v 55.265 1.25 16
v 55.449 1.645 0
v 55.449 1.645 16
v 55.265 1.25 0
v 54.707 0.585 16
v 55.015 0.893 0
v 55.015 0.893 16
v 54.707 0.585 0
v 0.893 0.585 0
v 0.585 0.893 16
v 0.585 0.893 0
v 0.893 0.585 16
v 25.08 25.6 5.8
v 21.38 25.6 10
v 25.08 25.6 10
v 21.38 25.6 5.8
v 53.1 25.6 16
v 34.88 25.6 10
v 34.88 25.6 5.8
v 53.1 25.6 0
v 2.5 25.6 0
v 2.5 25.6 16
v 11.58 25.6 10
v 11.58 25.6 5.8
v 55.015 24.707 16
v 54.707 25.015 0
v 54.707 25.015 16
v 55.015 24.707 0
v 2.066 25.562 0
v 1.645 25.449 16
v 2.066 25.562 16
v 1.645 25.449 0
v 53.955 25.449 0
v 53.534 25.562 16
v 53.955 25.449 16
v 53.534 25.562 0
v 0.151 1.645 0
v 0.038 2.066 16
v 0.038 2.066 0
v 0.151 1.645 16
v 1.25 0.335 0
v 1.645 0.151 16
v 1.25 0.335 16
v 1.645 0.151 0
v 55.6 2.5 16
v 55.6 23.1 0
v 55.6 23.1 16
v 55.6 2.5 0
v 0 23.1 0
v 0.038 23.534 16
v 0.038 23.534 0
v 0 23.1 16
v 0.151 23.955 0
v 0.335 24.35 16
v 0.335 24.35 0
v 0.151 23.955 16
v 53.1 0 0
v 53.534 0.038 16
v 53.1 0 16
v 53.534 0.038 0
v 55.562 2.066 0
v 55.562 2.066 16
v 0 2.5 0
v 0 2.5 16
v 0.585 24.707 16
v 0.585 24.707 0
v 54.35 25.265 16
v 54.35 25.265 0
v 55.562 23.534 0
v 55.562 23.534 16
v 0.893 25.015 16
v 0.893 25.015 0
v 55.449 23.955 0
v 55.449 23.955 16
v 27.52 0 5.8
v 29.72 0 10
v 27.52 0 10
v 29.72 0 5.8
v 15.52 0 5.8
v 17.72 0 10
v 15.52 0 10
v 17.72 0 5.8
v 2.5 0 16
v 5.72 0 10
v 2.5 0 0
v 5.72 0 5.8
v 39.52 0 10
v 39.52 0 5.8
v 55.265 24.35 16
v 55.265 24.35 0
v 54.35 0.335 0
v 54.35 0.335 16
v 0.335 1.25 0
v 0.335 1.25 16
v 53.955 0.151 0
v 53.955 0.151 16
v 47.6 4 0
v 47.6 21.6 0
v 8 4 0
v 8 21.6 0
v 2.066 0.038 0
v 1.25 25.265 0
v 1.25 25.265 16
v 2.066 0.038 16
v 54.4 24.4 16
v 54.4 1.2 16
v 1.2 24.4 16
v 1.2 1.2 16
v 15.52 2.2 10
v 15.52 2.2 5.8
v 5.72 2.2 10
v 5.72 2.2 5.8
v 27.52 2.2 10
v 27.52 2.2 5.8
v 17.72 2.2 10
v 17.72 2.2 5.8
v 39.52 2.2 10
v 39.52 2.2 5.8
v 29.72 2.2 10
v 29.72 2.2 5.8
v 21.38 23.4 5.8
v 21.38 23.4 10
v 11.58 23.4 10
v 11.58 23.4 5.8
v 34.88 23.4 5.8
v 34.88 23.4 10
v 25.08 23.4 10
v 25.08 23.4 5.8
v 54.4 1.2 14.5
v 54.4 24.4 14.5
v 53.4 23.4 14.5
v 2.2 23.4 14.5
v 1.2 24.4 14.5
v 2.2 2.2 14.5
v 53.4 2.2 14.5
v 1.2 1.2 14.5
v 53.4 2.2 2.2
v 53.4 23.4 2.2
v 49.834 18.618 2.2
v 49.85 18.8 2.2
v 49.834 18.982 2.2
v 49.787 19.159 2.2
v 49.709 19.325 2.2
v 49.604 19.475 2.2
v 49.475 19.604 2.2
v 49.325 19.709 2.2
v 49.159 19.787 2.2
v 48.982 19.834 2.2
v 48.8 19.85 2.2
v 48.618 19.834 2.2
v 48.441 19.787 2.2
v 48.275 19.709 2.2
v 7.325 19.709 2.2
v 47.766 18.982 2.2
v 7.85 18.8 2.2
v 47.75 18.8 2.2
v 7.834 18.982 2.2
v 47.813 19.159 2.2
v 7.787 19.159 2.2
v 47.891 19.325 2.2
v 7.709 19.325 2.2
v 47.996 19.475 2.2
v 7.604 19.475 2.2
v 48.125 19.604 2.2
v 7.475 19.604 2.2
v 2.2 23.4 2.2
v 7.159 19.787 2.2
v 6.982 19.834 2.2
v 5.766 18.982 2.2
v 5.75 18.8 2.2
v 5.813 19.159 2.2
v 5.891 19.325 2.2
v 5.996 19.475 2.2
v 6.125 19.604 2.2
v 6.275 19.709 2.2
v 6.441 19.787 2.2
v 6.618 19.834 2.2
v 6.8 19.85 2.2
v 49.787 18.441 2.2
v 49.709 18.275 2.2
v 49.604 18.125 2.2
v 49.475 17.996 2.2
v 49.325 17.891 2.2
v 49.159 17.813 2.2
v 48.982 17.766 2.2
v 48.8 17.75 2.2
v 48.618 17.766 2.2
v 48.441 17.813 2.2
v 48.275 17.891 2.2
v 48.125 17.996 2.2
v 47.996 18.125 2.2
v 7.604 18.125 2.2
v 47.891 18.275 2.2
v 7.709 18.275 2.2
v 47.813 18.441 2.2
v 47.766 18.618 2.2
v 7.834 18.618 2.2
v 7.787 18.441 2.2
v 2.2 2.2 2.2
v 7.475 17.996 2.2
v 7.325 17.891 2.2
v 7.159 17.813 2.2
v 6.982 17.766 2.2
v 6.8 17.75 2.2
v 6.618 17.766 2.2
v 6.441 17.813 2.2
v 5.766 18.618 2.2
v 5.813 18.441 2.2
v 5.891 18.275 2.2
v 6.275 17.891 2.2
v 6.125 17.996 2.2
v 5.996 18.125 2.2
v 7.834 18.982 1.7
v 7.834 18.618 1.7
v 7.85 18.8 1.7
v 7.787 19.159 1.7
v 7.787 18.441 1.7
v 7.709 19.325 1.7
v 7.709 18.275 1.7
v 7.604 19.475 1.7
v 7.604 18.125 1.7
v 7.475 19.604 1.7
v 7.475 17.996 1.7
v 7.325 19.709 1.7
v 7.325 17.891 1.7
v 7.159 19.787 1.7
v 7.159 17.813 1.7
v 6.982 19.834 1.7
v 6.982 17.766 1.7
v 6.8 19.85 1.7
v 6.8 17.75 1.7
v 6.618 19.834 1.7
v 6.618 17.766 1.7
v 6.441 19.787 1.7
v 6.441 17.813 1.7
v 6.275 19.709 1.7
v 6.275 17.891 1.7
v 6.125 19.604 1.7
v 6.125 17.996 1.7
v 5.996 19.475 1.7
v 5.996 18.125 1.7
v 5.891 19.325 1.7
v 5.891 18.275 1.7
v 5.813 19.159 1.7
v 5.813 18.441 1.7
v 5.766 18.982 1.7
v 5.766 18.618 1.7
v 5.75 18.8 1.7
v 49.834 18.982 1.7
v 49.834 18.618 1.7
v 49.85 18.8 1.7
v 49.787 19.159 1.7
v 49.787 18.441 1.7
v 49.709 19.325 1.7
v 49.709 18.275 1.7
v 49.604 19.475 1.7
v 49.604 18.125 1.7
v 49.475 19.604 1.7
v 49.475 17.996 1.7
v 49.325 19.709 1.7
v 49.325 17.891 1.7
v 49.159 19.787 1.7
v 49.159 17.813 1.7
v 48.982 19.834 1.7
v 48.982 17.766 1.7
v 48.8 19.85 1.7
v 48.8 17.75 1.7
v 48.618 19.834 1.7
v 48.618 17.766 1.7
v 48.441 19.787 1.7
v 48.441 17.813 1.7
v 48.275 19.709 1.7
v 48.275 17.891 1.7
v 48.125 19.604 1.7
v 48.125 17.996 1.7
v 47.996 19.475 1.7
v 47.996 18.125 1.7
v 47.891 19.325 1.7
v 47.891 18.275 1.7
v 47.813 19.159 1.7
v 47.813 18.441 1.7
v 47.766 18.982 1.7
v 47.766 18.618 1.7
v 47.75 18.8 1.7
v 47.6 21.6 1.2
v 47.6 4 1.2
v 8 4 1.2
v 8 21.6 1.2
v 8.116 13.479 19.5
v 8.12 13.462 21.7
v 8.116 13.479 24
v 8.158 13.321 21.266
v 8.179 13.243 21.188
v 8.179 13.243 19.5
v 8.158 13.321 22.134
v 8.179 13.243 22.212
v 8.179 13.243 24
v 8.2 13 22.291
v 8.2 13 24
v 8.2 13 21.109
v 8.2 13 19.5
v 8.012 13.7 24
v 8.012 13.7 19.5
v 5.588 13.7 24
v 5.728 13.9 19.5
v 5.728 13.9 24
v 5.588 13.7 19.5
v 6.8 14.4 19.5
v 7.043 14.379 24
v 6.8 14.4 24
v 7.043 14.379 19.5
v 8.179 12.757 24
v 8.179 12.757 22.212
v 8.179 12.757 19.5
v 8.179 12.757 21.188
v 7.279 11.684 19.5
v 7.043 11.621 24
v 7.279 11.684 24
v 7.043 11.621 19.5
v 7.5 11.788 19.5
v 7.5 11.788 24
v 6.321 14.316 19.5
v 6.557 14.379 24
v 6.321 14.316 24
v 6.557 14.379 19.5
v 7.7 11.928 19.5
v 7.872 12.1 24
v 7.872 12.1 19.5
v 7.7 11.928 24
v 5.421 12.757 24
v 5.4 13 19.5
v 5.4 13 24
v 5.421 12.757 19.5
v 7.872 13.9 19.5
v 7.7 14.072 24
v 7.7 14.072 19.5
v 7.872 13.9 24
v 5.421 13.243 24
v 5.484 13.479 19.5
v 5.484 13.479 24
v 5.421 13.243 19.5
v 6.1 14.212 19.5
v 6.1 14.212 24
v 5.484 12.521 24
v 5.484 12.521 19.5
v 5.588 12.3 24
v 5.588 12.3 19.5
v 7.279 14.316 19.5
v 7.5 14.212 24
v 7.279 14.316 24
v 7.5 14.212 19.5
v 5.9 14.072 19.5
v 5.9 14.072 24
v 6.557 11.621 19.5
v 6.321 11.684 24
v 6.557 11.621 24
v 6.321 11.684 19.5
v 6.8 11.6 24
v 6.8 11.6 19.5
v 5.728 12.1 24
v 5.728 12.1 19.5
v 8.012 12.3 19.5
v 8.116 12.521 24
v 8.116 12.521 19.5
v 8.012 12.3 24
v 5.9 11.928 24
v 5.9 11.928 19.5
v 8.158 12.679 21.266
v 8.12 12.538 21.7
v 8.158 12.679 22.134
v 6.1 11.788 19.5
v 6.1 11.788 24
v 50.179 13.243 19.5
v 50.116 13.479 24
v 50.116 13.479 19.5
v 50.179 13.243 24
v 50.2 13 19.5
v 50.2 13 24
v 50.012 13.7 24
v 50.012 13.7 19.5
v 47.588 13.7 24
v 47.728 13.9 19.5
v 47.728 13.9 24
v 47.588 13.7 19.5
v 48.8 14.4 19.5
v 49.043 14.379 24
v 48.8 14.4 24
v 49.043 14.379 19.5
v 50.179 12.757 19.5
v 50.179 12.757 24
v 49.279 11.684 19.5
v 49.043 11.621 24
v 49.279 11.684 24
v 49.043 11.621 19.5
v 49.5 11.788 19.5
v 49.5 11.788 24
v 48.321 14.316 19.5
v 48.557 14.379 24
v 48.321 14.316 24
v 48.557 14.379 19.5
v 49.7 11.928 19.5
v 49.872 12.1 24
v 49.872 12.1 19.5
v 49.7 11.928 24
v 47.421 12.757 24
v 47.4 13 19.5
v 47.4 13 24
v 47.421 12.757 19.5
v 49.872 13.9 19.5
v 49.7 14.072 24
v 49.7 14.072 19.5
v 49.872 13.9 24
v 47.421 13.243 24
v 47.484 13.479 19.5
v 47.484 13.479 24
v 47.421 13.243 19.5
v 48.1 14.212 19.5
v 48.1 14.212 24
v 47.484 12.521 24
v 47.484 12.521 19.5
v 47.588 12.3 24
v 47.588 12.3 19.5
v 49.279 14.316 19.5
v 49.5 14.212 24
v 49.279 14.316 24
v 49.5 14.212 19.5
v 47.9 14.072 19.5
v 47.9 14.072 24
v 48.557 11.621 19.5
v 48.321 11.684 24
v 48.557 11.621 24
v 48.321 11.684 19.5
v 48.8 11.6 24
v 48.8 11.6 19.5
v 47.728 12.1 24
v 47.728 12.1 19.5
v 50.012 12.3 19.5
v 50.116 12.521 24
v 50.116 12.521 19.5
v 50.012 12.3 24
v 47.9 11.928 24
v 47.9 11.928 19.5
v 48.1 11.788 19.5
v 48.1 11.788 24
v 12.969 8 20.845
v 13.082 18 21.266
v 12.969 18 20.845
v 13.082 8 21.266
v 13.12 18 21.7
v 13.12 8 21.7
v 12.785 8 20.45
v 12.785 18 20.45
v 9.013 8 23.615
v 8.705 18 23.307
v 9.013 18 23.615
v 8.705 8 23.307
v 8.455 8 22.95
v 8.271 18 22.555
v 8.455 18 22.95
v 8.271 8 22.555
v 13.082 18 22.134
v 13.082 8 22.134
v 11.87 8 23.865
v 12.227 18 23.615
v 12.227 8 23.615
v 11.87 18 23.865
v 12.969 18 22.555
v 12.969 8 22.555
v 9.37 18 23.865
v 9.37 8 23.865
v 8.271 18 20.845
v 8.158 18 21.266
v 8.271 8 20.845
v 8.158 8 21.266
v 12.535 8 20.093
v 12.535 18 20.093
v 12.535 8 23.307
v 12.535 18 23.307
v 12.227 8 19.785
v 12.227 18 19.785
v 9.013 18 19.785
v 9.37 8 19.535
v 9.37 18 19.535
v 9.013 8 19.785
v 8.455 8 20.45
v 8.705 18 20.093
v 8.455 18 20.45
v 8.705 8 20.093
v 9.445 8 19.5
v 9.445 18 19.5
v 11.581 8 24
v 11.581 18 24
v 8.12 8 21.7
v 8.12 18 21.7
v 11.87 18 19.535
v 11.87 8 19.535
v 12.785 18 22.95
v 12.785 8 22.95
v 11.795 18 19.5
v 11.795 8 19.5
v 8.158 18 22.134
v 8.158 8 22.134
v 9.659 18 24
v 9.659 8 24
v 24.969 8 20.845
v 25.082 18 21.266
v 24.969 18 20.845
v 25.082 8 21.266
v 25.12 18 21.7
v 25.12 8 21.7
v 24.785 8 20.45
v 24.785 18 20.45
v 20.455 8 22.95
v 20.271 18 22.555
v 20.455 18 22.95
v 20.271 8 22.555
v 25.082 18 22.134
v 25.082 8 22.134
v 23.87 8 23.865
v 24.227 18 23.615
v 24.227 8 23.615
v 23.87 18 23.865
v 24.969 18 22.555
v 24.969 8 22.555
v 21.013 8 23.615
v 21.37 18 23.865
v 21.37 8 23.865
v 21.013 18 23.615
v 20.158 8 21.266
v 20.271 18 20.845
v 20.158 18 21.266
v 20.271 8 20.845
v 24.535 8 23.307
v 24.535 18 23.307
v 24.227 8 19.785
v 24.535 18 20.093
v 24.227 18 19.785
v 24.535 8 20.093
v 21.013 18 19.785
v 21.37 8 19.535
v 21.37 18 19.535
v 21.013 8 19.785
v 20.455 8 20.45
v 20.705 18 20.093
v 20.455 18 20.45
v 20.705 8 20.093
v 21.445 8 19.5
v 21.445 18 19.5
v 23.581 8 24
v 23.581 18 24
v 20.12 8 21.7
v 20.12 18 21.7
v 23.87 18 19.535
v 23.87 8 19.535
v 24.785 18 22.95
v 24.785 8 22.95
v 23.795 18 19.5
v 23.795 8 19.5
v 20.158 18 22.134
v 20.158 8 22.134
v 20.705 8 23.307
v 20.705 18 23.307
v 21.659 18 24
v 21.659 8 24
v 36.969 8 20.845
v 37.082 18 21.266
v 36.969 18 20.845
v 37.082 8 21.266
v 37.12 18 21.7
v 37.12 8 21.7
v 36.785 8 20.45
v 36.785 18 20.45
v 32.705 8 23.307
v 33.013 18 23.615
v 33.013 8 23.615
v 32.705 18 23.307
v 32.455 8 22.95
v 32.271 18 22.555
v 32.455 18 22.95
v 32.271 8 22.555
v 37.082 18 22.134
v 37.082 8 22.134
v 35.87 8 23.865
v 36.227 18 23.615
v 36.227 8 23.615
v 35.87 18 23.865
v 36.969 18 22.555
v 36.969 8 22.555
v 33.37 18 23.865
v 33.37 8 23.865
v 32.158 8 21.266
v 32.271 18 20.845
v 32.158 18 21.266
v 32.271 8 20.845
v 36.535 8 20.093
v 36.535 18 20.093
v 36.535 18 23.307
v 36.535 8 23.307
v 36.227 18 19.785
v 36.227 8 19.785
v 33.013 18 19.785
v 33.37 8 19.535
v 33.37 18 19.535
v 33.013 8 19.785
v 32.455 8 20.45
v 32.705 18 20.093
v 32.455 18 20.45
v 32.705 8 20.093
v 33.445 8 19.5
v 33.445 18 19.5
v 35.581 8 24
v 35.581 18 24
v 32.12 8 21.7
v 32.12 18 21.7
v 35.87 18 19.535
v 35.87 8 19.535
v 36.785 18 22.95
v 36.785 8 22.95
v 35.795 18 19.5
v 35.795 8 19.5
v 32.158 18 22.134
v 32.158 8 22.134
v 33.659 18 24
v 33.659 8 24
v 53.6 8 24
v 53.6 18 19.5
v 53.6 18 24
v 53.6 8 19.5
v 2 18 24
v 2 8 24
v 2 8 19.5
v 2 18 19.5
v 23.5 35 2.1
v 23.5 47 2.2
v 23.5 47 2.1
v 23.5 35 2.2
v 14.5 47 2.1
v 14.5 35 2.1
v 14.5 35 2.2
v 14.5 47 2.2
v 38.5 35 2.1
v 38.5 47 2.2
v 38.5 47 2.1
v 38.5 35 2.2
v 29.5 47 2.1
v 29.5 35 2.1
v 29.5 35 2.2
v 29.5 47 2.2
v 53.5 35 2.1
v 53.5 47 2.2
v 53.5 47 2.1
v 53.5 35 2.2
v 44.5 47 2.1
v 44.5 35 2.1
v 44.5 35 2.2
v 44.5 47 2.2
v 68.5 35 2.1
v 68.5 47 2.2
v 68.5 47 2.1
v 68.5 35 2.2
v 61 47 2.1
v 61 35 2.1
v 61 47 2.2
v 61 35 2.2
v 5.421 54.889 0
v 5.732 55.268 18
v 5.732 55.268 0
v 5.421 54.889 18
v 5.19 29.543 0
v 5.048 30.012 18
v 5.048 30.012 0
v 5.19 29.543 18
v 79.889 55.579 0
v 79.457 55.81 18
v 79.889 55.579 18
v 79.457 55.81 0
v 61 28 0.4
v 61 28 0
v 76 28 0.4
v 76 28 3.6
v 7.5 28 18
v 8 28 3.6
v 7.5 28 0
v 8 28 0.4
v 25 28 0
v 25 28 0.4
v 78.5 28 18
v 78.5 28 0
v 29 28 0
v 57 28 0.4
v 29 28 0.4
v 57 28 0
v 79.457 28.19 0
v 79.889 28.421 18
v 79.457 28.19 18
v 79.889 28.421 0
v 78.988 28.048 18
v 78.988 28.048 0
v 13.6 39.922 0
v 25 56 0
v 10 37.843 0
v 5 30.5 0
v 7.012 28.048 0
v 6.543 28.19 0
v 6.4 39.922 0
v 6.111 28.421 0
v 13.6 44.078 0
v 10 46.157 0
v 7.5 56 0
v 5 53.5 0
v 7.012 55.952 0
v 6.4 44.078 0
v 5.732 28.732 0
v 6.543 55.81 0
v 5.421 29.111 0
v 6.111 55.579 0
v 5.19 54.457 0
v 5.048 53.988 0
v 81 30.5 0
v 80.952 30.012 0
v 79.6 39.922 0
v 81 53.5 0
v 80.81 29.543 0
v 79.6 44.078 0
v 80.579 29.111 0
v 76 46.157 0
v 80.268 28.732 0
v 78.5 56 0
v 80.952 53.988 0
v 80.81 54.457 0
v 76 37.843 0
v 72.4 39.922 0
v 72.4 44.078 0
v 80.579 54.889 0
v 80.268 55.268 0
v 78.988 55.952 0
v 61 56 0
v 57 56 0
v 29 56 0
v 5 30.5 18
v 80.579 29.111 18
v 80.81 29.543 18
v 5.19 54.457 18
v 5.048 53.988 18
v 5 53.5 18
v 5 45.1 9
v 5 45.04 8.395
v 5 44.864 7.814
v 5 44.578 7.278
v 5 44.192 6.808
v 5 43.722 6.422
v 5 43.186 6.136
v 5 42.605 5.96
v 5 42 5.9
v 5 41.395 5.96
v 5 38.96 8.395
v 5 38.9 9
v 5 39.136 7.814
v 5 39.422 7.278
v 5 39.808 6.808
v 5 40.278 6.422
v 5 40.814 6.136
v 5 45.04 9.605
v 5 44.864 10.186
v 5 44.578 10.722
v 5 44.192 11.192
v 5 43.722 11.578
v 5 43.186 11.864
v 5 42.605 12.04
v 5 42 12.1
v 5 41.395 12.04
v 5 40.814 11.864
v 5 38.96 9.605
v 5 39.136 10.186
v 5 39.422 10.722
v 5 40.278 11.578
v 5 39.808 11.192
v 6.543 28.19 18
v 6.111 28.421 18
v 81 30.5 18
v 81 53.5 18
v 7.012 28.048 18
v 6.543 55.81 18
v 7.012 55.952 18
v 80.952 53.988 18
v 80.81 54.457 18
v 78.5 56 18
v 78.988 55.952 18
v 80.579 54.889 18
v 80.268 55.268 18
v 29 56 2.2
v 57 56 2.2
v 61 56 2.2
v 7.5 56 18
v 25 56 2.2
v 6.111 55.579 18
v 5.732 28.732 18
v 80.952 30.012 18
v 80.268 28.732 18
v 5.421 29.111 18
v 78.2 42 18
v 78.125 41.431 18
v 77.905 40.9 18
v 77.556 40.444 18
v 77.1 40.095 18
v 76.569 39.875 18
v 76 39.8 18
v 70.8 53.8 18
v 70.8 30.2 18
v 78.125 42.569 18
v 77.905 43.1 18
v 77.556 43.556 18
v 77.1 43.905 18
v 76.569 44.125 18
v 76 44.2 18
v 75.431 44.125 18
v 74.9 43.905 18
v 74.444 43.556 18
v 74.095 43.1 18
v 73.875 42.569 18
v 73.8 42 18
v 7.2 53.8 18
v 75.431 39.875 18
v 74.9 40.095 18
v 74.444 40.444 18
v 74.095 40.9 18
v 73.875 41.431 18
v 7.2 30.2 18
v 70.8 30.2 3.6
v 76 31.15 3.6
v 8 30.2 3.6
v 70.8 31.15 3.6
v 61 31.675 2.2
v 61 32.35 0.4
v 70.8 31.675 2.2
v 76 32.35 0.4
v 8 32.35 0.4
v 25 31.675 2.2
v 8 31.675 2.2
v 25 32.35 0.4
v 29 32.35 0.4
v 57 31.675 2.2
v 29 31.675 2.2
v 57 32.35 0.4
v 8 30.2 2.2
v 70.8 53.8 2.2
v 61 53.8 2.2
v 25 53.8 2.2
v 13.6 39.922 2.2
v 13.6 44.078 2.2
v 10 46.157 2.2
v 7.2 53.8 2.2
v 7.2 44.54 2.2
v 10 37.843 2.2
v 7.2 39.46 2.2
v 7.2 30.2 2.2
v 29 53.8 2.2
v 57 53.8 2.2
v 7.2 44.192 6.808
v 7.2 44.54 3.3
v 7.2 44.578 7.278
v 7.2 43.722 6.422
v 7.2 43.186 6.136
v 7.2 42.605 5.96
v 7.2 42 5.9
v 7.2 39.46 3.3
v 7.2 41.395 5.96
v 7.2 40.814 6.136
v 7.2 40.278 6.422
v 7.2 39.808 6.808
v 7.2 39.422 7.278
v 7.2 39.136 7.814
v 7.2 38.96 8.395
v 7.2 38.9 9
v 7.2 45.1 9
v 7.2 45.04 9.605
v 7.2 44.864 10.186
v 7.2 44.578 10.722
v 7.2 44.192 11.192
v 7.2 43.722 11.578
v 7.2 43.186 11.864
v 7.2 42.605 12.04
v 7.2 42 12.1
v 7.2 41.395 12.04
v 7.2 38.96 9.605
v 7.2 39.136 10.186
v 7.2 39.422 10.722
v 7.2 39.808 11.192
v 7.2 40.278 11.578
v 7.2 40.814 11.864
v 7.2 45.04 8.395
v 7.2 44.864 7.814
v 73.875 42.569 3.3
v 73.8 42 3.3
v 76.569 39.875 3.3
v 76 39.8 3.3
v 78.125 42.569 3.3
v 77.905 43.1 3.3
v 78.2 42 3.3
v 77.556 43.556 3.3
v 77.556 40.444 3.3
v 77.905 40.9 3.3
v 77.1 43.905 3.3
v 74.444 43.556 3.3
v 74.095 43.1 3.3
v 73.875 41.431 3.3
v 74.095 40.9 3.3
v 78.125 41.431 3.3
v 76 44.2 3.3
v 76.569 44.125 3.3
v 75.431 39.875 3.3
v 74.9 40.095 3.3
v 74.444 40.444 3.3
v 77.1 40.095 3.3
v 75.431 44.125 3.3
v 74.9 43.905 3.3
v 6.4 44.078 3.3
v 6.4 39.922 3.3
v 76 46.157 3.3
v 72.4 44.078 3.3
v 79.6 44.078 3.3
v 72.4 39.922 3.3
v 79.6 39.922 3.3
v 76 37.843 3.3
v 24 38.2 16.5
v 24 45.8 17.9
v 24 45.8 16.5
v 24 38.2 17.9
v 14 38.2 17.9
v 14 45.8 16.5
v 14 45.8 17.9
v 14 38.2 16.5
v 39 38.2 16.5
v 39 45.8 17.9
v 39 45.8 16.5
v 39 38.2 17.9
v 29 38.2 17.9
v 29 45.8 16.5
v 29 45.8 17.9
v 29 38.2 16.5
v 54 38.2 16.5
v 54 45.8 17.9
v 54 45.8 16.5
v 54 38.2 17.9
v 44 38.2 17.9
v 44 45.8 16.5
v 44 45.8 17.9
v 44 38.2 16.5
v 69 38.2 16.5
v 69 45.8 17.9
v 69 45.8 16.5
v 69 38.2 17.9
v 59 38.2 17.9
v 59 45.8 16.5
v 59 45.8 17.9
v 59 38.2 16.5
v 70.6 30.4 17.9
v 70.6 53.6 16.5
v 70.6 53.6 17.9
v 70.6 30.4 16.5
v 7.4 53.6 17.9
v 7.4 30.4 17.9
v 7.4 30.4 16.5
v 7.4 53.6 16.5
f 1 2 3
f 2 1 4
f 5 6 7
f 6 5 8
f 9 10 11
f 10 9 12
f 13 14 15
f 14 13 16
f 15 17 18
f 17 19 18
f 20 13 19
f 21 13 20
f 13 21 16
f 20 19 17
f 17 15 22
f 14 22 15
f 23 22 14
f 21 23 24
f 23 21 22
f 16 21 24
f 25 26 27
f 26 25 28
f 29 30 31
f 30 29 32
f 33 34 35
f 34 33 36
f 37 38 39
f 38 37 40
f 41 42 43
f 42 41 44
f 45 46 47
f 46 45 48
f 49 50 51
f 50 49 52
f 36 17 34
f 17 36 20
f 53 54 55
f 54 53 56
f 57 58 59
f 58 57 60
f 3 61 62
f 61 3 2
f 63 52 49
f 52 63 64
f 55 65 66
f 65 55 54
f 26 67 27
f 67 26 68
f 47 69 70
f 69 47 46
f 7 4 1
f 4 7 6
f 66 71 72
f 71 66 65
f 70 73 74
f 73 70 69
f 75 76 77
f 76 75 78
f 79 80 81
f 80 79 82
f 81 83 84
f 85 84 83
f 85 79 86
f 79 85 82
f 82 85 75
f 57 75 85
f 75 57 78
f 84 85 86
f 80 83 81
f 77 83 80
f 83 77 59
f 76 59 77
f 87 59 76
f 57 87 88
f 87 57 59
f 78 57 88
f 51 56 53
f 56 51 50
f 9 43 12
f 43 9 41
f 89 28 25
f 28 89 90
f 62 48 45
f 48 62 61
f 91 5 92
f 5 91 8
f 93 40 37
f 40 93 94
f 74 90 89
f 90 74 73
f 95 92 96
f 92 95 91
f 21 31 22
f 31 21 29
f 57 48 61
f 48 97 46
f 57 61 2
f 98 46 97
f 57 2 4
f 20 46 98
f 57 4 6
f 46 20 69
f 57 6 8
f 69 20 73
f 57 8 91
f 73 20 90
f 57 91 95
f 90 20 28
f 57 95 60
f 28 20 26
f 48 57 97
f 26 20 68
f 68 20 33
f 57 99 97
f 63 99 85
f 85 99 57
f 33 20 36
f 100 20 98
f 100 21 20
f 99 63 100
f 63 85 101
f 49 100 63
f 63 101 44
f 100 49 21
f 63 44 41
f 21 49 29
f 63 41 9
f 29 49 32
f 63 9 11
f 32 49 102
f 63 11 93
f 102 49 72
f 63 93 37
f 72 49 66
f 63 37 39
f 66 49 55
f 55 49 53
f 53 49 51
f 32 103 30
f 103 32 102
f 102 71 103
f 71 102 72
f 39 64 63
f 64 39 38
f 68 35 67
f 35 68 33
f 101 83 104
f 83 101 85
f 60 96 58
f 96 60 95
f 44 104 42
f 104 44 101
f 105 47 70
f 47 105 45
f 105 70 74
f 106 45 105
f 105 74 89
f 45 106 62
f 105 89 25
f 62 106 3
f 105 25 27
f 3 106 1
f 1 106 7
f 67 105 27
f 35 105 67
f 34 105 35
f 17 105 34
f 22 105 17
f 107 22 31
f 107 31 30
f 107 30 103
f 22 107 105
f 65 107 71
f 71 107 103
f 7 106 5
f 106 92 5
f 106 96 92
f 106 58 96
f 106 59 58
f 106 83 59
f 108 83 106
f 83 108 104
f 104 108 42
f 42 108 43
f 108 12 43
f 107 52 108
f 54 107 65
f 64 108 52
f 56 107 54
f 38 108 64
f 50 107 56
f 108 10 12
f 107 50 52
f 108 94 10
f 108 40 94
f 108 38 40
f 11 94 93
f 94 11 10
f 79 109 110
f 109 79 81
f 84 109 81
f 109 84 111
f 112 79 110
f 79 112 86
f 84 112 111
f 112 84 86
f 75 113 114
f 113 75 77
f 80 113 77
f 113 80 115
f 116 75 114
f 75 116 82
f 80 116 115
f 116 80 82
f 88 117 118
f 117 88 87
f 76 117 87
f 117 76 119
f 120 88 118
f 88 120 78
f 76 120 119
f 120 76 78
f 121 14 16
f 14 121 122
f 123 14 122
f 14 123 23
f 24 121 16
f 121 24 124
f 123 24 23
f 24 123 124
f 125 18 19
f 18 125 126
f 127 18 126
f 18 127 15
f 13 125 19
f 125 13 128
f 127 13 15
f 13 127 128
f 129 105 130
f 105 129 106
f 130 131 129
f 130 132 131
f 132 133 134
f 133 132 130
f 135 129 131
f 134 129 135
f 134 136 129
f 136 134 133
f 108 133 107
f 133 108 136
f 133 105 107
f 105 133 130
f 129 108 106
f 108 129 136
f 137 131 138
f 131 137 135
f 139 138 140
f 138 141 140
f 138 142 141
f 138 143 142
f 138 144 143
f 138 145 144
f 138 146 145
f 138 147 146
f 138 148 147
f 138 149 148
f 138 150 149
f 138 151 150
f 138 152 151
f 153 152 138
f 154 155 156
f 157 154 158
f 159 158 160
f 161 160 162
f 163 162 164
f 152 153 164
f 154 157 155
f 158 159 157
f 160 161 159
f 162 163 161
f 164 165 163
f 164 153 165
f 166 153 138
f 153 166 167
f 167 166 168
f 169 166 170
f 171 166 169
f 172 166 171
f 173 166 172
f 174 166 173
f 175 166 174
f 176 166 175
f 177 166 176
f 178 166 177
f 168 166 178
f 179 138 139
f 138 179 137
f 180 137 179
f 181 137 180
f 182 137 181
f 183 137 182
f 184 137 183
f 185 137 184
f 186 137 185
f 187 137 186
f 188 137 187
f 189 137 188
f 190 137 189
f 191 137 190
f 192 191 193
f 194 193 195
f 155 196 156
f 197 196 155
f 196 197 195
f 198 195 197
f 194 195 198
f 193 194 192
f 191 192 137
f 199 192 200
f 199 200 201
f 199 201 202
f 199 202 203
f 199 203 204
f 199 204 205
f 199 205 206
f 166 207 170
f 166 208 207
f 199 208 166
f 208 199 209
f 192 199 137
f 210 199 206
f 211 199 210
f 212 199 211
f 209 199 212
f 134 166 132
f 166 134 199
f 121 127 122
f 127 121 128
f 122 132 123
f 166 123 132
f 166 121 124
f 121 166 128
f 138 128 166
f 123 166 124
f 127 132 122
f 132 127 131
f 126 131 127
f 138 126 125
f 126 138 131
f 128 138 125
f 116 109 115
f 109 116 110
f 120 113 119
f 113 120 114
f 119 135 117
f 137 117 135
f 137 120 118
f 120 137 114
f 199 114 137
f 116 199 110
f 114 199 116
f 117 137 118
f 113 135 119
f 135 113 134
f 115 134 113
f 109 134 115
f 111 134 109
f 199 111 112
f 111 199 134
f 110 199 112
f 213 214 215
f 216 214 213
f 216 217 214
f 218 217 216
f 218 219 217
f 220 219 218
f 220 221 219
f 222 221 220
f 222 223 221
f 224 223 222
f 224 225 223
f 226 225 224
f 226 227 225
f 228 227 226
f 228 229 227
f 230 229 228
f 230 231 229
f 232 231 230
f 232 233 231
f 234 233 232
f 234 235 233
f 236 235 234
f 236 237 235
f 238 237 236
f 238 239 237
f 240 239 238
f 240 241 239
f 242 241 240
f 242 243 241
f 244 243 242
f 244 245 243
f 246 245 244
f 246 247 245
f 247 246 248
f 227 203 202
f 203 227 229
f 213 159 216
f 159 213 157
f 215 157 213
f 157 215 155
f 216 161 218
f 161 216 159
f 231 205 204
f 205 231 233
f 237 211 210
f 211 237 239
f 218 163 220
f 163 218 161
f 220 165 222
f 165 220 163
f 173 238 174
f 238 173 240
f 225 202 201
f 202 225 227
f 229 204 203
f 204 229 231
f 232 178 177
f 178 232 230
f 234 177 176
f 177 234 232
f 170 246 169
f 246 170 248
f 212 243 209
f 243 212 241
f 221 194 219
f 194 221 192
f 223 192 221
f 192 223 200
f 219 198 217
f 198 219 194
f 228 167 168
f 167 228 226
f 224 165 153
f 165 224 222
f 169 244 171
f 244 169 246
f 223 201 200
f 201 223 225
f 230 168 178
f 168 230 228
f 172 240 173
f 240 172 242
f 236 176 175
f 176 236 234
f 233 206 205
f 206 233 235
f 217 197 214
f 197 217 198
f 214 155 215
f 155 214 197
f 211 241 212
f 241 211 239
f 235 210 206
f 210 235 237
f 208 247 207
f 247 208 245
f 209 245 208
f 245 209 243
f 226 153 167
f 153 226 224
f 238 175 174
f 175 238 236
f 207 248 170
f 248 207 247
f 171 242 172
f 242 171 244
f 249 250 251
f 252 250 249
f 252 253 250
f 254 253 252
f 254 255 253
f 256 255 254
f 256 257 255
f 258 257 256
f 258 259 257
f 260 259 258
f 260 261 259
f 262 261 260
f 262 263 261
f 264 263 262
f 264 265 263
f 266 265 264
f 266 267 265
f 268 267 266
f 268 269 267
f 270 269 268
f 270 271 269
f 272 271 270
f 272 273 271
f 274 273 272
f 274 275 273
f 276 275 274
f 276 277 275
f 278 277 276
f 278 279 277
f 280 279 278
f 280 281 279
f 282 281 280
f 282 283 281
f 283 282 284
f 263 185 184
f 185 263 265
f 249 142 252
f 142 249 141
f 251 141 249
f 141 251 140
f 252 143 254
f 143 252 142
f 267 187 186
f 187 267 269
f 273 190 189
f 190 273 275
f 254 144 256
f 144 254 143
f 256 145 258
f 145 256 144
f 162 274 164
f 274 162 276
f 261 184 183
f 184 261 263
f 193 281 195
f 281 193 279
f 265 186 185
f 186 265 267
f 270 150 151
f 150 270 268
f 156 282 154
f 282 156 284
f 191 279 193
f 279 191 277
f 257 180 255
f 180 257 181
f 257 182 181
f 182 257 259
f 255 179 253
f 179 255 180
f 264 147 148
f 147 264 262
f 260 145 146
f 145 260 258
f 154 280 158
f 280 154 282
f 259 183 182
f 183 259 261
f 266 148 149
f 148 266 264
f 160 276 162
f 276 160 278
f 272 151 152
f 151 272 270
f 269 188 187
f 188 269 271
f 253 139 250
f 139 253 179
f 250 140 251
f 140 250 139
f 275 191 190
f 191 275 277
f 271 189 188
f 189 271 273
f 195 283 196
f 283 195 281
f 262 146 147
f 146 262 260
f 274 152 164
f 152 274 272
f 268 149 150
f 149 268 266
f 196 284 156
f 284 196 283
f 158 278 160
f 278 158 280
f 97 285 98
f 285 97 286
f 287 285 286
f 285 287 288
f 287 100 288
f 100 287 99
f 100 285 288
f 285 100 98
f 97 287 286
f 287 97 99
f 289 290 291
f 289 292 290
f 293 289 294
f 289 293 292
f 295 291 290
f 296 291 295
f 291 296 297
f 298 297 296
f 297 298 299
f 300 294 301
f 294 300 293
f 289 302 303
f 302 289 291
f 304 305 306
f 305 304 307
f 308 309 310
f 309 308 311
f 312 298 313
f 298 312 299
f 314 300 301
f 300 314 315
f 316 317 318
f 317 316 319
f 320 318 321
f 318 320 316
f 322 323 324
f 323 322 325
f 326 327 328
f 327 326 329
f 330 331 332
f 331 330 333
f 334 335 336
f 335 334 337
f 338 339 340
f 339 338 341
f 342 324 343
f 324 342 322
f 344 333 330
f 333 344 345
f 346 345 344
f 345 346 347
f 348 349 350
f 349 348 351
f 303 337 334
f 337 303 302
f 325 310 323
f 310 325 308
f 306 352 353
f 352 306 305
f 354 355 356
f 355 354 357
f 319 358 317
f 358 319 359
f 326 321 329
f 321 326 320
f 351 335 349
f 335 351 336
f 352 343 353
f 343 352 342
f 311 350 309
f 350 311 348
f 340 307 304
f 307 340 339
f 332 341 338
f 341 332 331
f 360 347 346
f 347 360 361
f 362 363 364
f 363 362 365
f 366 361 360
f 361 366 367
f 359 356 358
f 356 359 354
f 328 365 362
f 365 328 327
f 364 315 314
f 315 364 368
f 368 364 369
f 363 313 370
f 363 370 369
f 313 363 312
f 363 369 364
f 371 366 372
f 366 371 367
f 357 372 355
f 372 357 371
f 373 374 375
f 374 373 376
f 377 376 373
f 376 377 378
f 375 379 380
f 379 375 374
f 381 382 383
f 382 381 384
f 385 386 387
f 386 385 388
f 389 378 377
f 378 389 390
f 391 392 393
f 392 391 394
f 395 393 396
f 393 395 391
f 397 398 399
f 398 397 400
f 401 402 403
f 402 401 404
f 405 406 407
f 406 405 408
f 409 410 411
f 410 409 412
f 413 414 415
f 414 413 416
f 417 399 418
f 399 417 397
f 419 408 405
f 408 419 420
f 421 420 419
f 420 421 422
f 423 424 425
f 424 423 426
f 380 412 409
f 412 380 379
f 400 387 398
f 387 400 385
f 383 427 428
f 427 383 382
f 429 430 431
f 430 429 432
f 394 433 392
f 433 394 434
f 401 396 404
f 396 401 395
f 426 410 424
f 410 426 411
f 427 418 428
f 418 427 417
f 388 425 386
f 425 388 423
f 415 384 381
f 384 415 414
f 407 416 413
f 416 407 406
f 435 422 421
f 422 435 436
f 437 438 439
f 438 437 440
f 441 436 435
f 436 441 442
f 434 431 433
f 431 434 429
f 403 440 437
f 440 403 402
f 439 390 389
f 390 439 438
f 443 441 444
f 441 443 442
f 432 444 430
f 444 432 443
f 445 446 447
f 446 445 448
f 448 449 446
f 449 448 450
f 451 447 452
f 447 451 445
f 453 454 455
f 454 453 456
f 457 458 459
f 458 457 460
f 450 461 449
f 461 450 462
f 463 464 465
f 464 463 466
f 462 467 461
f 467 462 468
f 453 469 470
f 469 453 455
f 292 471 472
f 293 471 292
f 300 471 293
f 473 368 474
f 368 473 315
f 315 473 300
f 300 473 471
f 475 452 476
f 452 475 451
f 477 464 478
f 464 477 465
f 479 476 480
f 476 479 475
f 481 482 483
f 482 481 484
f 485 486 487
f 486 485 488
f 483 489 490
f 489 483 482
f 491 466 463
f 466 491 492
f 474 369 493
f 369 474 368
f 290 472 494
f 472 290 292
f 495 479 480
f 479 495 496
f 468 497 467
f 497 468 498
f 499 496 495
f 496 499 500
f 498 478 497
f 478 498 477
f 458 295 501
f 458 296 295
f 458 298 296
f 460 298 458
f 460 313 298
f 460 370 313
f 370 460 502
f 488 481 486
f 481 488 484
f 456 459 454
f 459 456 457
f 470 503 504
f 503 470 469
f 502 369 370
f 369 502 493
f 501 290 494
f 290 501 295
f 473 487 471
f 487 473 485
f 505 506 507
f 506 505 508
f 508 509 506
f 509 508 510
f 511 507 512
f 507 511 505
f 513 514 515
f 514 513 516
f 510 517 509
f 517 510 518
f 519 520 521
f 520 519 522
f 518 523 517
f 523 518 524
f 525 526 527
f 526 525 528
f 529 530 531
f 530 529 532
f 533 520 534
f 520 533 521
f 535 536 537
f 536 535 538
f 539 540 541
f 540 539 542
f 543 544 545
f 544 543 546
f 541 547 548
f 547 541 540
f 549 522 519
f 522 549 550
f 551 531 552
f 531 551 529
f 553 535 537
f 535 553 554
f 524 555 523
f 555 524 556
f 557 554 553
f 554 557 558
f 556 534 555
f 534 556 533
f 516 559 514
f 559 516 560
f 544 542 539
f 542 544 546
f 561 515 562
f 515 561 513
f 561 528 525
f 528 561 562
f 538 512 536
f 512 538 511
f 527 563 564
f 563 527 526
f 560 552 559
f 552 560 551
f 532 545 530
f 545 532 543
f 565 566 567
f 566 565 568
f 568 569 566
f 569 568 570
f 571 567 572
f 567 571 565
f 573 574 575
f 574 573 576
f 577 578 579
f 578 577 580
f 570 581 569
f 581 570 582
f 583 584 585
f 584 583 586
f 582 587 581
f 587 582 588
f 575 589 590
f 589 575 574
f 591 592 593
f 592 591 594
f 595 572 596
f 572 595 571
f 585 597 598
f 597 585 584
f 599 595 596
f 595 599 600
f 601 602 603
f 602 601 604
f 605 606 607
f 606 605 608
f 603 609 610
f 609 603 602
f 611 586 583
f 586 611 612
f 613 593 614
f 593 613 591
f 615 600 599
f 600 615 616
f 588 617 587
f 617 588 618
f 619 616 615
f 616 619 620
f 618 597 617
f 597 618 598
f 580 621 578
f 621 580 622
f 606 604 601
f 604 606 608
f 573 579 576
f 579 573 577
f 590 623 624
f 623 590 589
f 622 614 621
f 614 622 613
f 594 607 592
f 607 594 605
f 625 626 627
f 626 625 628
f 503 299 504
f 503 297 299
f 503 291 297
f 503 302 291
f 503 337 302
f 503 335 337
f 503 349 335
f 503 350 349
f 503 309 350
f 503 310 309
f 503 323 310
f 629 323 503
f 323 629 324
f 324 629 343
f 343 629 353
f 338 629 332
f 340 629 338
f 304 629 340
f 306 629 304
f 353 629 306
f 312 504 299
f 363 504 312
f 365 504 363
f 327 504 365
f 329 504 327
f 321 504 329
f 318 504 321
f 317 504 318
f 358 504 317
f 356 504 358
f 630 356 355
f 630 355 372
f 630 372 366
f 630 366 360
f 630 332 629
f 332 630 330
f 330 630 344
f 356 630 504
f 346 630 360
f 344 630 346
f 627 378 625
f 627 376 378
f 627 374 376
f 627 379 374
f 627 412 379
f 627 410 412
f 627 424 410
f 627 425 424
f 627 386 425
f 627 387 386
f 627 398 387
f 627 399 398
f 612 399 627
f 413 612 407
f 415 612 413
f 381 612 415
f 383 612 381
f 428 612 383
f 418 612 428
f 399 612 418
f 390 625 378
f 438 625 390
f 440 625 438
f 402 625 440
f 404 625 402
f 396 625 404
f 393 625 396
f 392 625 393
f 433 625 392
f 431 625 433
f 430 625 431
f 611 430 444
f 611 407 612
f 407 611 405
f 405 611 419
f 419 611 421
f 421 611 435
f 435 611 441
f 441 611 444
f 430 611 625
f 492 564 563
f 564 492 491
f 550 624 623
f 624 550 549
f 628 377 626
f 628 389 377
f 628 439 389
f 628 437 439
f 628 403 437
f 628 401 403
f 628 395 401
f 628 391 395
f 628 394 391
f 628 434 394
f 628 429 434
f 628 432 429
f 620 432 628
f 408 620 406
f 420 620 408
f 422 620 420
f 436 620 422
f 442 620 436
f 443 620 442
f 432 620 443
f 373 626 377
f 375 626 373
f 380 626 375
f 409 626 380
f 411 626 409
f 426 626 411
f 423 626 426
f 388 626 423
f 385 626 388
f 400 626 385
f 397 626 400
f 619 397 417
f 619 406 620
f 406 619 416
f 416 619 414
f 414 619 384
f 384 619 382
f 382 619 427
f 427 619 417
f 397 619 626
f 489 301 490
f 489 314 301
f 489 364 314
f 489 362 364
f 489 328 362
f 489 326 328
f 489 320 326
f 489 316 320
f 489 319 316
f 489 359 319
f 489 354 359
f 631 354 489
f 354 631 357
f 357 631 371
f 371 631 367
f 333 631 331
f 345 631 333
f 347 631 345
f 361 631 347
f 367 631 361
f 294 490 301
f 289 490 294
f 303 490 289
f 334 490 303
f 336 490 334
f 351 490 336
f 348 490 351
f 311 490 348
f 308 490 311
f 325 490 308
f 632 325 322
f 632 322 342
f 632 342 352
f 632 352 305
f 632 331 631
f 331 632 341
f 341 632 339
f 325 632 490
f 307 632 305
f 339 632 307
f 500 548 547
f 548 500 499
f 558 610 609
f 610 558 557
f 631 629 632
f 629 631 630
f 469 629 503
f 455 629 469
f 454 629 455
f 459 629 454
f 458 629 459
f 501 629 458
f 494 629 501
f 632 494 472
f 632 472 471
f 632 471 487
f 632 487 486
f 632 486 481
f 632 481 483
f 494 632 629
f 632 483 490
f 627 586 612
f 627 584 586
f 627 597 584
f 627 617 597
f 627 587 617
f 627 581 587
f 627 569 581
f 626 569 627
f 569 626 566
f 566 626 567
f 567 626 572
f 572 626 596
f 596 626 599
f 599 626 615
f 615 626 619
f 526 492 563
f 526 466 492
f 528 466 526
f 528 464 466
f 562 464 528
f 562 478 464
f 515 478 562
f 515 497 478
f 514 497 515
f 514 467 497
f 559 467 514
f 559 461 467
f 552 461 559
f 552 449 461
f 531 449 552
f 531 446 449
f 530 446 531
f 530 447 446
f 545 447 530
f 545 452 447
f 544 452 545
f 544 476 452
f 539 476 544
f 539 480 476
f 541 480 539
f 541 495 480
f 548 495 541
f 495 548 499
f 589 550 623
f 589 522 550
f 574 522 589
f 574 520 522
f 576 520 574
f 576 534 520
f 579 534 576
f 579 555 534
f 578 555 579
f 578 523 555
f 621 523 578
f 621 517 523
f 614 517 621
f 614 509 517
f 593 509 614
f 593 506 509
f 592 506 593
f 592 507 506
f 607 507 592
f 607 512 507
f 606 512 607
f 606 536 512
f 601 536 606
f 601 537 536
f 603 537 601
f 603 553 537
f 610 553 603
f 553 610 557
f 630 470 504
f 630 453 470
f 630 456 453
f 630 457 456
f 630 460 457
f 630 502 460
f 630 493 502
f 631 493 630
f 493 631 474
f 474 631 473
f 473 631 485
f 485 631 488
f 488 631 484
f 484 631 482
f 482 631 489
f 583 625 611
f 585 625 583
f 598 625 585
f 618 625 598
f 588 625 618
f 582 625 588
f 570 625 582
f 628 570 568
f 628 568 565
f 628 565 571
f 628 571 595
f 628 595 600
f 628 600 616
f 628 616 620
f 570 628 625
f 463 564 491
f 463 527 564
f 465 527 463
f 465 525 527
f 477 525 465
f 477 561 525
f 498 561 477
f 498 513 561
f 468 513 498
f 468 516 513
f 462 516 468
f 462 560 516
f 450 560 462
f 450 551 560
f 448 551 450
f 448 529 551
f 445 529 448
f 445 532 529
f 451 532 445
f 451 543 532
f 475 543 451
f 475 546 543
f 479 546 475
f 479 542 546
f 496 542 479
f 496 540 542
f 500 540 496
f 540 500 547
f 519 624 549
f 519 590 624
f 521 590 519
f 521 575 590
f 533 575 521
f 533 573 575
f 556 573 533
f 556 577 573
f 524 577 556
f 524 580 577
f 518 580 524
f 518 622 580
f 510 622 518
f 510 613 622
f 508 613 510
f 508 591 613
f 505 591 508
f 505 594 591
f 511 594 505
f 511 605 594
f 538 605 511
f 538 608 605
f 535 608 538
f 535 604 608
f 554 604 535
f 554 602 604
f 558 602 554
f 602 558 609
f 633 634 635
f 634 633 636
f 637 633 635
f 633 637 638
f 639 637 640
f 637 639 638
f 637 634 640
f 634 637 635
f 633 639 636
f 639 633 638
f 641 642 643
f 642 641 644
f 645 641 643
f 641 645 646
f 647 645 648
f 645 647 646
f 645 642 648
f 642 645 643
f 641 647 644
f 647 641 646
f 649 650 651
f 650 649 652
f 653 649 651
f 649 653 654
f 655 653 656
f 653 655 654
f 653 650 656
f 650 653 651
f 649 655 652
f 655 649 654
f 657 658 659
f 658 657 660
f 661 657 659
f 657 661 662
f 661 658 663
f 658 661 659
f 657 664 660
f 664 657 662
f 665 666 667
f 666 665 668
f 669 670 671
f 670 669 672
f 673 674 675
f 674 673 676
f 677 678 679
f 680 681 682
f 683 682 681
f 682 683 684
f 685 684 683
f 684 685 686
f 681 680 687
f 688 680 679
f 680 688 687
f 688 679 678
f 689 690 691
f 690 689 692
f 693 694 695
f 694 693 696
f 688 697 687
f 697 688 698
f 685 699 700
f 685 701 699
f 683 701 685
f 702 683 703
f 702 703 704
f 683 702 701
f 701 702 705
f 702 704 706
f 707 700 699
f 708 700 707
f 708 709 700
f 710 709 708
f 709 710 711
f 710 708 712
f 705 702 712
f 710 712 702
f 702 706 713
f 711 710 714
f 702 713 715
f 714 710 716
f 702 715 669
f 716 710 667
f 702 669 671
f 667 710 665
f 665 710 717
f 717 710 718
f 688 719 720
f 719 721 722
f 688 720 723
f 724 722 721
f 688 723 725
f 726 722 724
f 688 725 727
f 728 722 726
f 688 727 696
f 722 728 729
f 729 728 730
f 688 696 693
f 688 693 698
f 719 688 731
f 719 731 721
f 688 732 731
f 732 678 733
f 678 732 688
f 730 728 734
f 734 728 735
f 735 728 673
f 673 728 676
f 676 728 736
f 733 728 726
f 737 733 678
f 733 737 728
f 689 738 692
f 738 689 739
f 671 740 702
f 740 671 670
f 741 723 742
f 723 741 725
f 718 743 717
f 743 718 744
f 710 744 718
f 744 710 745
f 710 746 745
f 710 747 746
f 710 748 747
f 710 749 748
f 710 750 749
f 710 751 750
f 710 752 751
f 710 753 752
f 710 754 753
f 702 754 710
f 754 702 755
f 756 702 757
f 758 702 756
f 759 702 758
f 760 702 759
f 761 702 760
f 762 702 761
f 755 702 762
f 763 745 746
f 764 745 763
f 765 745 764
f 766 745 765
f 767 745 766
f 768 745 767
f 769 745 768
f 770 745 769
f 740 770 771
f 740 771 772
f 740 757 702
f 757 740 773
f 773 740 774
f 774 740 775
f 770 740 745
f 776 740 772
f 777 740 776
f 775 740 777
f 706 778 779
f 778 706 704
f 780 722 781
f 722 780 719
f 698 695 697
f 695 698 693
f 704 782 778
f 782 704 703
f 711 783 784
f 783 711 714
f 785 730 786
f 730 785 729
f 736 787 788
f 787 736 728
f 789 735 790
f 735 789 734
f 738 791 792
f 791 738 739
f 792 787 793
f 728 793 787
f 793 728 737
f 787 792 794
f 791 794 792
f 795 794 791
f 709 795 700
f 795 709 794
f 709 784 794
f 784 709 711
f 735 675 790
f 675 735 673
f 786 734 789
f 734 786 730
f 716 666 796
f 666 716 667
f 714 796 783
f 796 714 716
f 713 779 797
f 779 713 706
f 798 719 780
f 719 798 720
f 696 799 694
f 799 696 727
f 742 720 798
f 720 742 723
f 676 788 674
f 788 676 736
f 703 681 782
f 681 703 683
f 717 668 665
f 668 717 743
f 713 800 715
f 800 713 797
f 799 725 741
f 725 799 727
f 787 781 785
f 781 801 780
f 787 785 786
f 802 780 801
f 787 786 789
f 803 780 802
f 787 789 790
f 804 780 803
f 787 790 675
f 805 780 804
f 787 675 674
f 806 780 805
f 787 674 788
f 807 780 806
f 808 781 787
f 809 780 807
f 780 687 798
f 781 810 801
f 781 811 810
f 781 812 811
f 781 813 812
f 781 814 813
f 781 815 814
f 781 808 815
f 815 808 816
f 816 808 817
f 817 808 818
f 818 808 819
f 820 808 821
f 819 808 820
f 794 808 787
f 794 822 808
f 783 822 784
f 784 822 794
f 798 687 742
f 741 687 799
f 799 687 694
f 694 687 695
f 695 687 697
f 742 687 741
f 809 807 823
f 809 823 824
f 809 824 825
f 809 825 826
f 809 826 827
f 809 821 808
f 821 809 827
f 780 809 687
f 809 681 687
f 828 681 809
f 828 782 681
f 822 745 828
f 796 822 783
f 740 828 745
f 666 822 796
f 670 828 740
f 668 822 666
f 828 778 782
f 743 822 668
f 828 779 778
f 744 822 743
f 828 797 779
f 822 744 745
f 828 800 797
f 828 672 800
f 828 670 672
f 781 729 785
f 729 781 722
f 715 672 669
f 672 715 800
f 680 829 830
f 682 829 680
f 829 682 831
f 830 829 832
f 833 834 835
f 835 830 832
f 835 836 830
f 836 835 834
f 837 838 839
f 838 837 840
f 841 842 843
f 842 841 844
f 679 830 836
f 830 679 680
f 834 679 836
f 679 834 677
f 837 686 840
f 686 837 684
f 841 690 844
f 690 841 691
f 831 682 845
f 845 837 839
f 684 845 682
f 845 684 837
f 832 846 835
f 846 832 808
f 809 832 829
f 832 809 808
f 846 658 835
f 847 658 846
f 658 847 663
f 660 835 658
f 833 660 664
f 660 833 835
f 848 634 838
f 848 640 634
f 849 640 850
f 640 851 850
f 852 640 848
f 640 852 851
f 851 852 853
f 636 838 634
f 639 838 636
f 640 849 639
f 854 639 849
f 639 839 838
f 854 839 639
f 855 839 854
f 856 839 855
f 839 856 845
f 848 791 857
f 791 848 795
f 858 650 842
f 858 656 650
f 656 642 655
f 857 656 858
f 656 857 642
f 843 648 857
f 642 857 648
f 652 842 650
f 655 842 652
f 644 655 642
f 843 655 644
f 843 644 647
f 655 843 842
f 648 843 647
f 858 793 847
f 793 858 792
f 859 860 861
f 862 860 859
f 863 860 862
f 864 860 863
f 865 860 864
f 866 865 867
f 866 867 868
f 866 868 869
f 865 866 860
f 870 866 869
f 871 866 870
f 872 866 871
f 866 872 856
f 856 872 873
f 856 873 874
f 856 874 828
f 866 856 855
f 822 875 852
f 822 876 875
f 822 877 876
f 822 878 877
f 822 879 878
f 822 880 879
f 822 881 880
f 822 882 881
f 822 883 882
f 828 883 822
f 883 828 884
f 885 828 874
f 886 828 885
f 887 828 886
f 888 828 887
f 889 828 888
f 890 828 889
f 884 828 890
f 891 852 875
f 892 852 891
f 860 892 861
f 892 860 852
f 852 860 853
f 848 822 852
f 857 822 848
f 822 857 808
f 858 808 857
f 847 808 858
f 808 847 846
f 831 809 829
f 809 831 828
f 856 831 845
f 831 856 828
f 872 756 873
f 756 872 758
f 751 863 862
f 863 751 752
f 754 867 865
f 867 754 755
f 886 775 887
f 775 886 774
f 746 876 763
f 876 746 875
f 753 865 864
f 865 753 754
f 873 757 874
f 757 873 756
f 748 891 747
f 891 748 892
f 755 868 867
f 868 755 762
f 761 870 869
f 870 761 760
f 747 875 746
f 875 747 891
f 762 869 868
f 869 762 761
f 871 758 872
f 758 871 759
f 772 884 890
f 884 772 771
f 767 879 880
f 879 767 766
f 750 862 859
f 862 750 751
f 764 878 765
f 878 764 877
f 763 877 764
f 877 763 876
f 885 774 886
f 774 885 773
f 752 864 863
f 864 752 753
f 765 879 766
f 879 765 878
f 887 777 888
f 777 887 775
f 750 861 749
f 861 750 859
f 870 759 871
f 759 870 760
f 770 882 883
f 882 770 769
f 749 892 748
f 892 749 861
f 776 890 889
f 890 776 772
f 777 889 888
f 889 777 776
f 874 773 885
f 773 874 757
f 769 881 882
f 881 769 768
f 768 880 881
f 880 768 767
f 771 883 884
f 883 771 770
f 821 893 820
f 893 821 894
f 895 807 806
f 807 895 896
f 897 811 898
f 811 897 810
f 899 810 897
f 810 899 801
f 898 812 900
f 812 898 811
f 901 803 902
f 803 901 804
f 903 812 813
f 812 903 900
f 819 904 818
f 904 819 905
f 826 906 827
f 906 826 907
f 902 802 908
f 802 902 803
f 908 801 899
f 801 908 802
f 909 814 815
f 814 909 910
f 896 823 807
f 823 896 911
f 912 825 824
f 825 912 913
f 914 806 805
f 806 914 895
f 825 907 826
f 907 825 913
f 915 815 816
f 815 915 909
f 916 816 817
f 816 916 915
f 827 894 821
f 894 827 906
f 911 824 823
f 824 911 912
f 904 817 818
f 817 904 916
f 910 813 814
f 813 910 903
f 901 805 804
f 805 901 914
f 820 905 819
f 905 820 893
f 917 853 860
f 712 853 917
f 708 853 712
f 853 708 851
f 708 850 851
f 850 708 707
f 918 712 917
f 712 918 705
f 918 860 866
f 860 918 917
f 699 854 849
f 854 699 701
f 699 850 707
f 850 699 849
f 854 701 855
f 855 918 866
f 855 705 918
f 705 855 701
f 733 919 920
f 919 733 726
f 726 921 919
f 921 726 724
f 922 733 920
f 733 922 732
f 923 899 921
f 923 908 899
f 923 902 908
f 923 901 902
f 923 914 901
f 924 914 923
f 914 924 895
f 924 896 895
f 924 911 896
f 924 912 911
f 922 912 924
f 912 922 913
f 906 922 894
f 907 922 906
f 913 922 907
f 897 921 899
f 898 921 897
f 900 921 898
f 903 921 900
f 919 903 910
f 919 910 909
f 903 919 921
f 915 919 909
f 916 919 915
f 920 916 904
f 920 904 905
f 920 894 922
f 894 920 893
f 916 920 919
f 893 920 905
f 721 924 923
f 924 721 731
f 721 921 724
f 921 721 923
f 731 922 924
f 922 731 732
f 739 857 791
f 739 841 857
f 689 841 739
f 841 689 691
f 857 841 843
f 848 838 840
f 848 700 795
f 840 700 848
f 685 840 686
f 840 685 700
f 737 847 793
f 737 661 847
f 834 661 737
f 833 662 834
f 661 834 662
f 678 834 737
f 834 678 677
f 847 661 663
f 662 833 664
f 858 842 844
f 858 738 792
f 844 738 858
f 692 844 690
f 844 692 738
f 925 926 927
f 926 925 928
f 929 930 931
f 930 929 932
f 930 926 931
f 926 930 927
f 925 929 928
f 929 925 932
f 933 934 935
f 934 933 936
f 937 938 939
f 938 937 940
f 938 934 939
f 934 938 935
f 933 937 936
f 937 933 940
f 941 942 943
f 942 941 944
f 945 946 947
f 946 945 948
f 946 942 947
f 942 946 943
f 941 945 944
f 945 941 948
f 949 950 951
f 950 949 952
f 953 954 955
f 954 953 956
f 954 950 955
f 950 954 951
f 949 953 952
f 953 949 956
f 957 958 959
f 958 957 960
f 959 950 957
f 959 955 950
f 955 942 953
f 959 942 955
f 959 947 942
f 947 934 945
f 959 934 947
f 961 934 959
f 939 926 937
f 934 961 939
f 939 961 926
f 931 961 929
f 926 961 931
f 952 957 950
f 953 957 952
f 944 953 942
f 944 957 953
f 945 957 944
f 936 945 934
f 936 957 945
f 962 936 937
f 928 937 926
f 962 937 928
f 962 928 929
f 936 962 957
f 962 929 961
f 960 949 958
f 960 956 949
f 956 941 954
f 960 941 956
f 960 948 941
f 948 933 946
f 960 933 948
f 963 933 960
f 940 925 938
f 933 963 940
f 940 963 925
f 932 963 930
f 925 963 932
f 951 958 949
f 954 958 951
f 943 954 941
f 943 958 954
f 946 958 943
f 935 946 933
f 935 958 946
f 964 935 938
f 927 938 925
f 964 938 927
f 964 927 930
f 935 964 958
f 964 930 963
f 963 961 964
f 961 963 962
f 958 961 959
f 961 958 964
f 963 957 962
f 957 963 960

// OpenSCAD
// file: vehicle_breakout_block.scad
// =============================================================================
// OpenMotorBridge - Vehicle Breakout Satellite Housing
// =============================================================================
// File: hardware/cad/scad/04_front_node/vehicle_breakout_block.scad
// Description: Modular 3D-printed distribution bar for vehicle subframe/beak.
//              Houses 4x latching waterproof COTS sockets (12V In KL15, CAN Bus,
//              Mirror BSD LEDs, Aux Light / 12V Navi) with dovetail mating
//              groove to slide-lock with cockpit_breakout_block.
// =============================================================================

include <../00_common/parameters.scad>;

part = "all"; // [all, body, lid]

// Main dimensions
VEHICLE_BLOCK_L = 76.0;
VEHICLE_BLOCK_W = 28.0;
VEHICLE_BLOCK_H = 18.0;
WALL            = 2.2;

// Dovetail interlocking parameters (matching cockpit_breakout_block)
DOVETAIL_W_BOTTOM = 6.0;
DOVETAIL_W_TOP    = 8.4;
DOVETAIL_H        = 3.0;
DOVETAIL_L        = VEHICLE_BLOCK_L - 10.0;

module dovetail_female(length = DOVETAIL_L + 2.0, clearance = 0.25) {
    linear_extrude(height = length) {
        polygon(points=[
            [-(DOVETAIL_W_BOTTOM/2 + clearance), -0.1],
            [ (DOVETAIL_W_BOTTOM/2 + clearance), -0.1],
            [ (DOVETAIL_W_TOP/2 + clearance),    DOVETAIL_H + 0.1],
            [-(DOVETAIL_W_TOP/2 + clearance),    DOVETAIL_H + 0.1]
        ]);
    }
}

// 1. Vehicle Breakout Main Housing
module vehicle_breakout_body() {
    color([0.22, 0.22, 0.24]) // Charcoal ASA / MJF PA12
    difference() {
        // Main solid rounded housing block
        hull() {
            translate([2.5, 2.5, 0])
                cylinder(r=2.5, h=VEHICLE_BLOCK_H, center=false, $fn=32);
            translate([VEHICLE_BLOCK_L - 2.5, 2.5, 0])
                cylinder(r=2.5, h=VEHICLE_BLOCK_H, center=false, $fn=32);
            translate([2.5, VEHICLE_BLOCK_W - 2.5, 0])
                cylinder(r=2.5, h=VEHICLE_BLOCK_H, center=false, $fn=32);
            translate([VEHICLE_BLOCK_L - 2.5, VEHICLE_BLOCK_W - 2.5, 0])
                cylinder(r=2.5, h=VEHICLE_BLOCK_H, center=false, $fn=32);
        }
        
        // Female Dovetail Slide Groove on South Edge (Y = 0) to mate with Cockpit Satellite
        translate([VEHICLE_BLOCK_L - 5.0, -0.1, 3.5])
            rotate([0, -90, 0])
                rotate([0, 0, 90])
                    dovetail_female();
                    
        // Internal wiring cavity
        translate([WALL, WALL, WALL])
            cube(size=[VEHICLE_BLOCK_L - 2*WALL - 8.0, VEHICLE_BLOCK_W - 2*WALL, VEHICLE_BLOCK_H], center=false);
            
        // Cable Inflow Gland on West Flank (Ø 6.2 mm bore for 8-conductor shielded harness)
        translate([-0.5, VEHICLE_BLOCK_W / 2.0, VEHICLE_BLOCK_H / 2.0])
            rotate([0, 90, 0])
                cylinder(r=3.1, h=WALL + 2.0, center=false, $fn=32);
                
        // Internal zip-tie strain relief channel
        translate([WALL + 3.0, VEHICLE_BLOCK_W/2.0 - 1.25, 0])
            cube(size=[2.5, 2.5, VEHICLE_BLOCK_H - 2.0], center=false);
            
        // 4x COTS Connector Sockets (Top face Z = VEHICLE_BLOCK_H)
        // Spaced along X at 14.0, 29.0, 44.0, 59.0 mm
        conn_x = [14.0, 29.0, 44.0, 59.0];
        for (cx = conn_x) {
            // Rectangular receptacle pocket for JST-JWPF / JST-SM latching plug (10.5 x 8.0 mm)
            translate([cx - 5.25, 10.0, VEHICLE_BLOCK_H - 12.0])
                cube(size=[10.5, 8.0, 12.5], center=false);
                
            // Latch clearance slot on rear face of socket
            translate([cx - 2.5, 18.0 - 0.1, VEHICLE_BLOCK_H - 8.0])
                cube(size=[5.0, 2.0, 8.5], center=false);
                
            // Solder lead wire passage down to floor
            translate([cx - 4.5, 7.0, WALL - 0.1])
                cube(size=[9.0, 12.0, VEHICLE_BLOCK_H - 10.0], center=false);
        }
        
        // 2x M4 Clearance Holes for direct subframe/beak bracket mounting (X = 5.0 and X = 71.0)
        translate([5.0, VEHICLE_BLOCK_W / 2.0, -0.5])
            cylinder(r=M4_SCREW_HOLE_R, h=VEHICLE_BLOCK_H + 1.0, center=false, $fn=24);
        translate([71.0, VEHICLE_BLOCK_W / 2.0, -0.5])
            cylinder(r=M4_SCREW_HOLE_R, h=VEHICLE_BLOCK_H + 1.0, center=false, $fn=24);
            
        // 2x Captive M4 Hex Nut Pockets on bottom (DIN 934)
        translate([5.0, VEHICLE_BLOCK_W / 2.0, -0.1])
            rotate([0, 0, 30])
                cylinder(r=NUT_M4_SW / (2 * cos(30)), h=NUT_M4_H, center=false, $fn=6);
        translate([71.0, VEHICLE_BLOCK_W / 2.0, -0.1])
            rotate([0, 0, 30])
                cylinder(r=NUT_M4_SW / (2 * cos(30)), h=NUT_M4_H, center=false, $fn=6);
                
        // 2x Zip-Tie Channels on bottom for frame tube fastening (4.0 x 2.2 mm)
        translate([20.0, -0.5, 0])
            cube(size=[4.0, VEHICLE_BLOCK_W + 1.0, 2.2], center=false);
        translate([52.0, -0.5, 0])
            cube(size=[4.0, VEHICLE_BLOCK_W + 1.0, 2.2], center=false);
    }
}

// 2. Weatherproof Snap-On Lid Plate
module vehicle_breakout_lid() {
    color([0.28, 0.28, 0.30])
    difference() {
        translate([WALL + 0.2, WALL + 0.2, VEHICLE_BLOCK_H - 1.5])
            cube(size=[VEHICLE_BLOCK_L - 2*WALL - 8.4, VEHICLE_BLOCK_W - 2*WALL - 0.4, 1.4], center=false);
            
        // Apertures for the 4 connectors
        conn_x = [14.0, 29.0, 44.0, 59.0];
        for (cx = conn_x) {
            translate([cx - 5.0, 10.2, VEHICLE_BLOCK_H - 2.0])
                cube(size=[10.0, 7.6, 3.0], center=false);
        }
    }
}

// Render selector
if (part == "lid") {
    vehicle_breakout_lid();
} else if (part == "body") {
    vehicle_breakout_body();
} else {
    vehicle_breakout_body();
    vehicle_breakout_lid();
}
// main file
// =============================================================================
// OpenMotorBridge - Breakout Satellites 3D Assembly & Interlock View
// =============================================================================
// File: hardware/cad/scad/04_front_node/breakout_satellites_assembly.scad
// Description: Multi-mode 3D assembly model for documentation rendering:
//              - "cockpit": Standalone Cockpit Breakout with 5x USB-C & clamp
//              - "vehicle": Standalone Vehicle Breakout with COTS latch sockets
//              - "combo": Both satellites slide-interlocked via lateral Dovetail joint
//              - "exploded": Exploded presentation for manuals and installation guides
// =============================================================================

include <../00_common/parameters.scad>;
use <cockpit_breakout_block.scad>;
use <vehicle_breakout_block.scad>;

mode = "combo"; // [cockpit, vehicle, combo, exploded]

module breakout_satellites_assembly() {
    if (mode == "cockpit") {
        cockpit_breakout_body();
        translate([0, 0, 18.0 + 3.0])
            cockpit_breakout_clamp();
    } else if (mode == "vehicle") {
        vehicle_breakout_body();
        vehicle_breakout_lid();
    } else if (mode == "exploded") {
        // Cockpit unit
        translate([0, -20.0, 0]) {
            cockpit_breakout_body();
            translate([0, 0, 18.0 + 12.0])
                cockpit_breakout_clamp();
        }
        // Vehicle unit
        translate([5.0, 30.0, 0]) {
            vehicle_breakout_body();
            translate([0, 0, 18.0 + 8.0])
                vehicle_breakout_lid();
        }
    } else {
        // "combo" - Interlocked via lateral Dovetail joint
        // Cockpit Satellite (Front / South)
        cockpit_breakout_body();
        translate([0, 0, 18.0 + 1.5])
            cockpit_breakout_clamp();
            
        // Vehicle Satellite (Rear / North, slid onto Dovetail rail at Y = 28.0 mm)
        translate([5.0, 28.0, 0]) {
            vehicle_breakout_body();
            vehicle_breakout_lid();
        }
    }
}

breakout_satellites_assembly();
